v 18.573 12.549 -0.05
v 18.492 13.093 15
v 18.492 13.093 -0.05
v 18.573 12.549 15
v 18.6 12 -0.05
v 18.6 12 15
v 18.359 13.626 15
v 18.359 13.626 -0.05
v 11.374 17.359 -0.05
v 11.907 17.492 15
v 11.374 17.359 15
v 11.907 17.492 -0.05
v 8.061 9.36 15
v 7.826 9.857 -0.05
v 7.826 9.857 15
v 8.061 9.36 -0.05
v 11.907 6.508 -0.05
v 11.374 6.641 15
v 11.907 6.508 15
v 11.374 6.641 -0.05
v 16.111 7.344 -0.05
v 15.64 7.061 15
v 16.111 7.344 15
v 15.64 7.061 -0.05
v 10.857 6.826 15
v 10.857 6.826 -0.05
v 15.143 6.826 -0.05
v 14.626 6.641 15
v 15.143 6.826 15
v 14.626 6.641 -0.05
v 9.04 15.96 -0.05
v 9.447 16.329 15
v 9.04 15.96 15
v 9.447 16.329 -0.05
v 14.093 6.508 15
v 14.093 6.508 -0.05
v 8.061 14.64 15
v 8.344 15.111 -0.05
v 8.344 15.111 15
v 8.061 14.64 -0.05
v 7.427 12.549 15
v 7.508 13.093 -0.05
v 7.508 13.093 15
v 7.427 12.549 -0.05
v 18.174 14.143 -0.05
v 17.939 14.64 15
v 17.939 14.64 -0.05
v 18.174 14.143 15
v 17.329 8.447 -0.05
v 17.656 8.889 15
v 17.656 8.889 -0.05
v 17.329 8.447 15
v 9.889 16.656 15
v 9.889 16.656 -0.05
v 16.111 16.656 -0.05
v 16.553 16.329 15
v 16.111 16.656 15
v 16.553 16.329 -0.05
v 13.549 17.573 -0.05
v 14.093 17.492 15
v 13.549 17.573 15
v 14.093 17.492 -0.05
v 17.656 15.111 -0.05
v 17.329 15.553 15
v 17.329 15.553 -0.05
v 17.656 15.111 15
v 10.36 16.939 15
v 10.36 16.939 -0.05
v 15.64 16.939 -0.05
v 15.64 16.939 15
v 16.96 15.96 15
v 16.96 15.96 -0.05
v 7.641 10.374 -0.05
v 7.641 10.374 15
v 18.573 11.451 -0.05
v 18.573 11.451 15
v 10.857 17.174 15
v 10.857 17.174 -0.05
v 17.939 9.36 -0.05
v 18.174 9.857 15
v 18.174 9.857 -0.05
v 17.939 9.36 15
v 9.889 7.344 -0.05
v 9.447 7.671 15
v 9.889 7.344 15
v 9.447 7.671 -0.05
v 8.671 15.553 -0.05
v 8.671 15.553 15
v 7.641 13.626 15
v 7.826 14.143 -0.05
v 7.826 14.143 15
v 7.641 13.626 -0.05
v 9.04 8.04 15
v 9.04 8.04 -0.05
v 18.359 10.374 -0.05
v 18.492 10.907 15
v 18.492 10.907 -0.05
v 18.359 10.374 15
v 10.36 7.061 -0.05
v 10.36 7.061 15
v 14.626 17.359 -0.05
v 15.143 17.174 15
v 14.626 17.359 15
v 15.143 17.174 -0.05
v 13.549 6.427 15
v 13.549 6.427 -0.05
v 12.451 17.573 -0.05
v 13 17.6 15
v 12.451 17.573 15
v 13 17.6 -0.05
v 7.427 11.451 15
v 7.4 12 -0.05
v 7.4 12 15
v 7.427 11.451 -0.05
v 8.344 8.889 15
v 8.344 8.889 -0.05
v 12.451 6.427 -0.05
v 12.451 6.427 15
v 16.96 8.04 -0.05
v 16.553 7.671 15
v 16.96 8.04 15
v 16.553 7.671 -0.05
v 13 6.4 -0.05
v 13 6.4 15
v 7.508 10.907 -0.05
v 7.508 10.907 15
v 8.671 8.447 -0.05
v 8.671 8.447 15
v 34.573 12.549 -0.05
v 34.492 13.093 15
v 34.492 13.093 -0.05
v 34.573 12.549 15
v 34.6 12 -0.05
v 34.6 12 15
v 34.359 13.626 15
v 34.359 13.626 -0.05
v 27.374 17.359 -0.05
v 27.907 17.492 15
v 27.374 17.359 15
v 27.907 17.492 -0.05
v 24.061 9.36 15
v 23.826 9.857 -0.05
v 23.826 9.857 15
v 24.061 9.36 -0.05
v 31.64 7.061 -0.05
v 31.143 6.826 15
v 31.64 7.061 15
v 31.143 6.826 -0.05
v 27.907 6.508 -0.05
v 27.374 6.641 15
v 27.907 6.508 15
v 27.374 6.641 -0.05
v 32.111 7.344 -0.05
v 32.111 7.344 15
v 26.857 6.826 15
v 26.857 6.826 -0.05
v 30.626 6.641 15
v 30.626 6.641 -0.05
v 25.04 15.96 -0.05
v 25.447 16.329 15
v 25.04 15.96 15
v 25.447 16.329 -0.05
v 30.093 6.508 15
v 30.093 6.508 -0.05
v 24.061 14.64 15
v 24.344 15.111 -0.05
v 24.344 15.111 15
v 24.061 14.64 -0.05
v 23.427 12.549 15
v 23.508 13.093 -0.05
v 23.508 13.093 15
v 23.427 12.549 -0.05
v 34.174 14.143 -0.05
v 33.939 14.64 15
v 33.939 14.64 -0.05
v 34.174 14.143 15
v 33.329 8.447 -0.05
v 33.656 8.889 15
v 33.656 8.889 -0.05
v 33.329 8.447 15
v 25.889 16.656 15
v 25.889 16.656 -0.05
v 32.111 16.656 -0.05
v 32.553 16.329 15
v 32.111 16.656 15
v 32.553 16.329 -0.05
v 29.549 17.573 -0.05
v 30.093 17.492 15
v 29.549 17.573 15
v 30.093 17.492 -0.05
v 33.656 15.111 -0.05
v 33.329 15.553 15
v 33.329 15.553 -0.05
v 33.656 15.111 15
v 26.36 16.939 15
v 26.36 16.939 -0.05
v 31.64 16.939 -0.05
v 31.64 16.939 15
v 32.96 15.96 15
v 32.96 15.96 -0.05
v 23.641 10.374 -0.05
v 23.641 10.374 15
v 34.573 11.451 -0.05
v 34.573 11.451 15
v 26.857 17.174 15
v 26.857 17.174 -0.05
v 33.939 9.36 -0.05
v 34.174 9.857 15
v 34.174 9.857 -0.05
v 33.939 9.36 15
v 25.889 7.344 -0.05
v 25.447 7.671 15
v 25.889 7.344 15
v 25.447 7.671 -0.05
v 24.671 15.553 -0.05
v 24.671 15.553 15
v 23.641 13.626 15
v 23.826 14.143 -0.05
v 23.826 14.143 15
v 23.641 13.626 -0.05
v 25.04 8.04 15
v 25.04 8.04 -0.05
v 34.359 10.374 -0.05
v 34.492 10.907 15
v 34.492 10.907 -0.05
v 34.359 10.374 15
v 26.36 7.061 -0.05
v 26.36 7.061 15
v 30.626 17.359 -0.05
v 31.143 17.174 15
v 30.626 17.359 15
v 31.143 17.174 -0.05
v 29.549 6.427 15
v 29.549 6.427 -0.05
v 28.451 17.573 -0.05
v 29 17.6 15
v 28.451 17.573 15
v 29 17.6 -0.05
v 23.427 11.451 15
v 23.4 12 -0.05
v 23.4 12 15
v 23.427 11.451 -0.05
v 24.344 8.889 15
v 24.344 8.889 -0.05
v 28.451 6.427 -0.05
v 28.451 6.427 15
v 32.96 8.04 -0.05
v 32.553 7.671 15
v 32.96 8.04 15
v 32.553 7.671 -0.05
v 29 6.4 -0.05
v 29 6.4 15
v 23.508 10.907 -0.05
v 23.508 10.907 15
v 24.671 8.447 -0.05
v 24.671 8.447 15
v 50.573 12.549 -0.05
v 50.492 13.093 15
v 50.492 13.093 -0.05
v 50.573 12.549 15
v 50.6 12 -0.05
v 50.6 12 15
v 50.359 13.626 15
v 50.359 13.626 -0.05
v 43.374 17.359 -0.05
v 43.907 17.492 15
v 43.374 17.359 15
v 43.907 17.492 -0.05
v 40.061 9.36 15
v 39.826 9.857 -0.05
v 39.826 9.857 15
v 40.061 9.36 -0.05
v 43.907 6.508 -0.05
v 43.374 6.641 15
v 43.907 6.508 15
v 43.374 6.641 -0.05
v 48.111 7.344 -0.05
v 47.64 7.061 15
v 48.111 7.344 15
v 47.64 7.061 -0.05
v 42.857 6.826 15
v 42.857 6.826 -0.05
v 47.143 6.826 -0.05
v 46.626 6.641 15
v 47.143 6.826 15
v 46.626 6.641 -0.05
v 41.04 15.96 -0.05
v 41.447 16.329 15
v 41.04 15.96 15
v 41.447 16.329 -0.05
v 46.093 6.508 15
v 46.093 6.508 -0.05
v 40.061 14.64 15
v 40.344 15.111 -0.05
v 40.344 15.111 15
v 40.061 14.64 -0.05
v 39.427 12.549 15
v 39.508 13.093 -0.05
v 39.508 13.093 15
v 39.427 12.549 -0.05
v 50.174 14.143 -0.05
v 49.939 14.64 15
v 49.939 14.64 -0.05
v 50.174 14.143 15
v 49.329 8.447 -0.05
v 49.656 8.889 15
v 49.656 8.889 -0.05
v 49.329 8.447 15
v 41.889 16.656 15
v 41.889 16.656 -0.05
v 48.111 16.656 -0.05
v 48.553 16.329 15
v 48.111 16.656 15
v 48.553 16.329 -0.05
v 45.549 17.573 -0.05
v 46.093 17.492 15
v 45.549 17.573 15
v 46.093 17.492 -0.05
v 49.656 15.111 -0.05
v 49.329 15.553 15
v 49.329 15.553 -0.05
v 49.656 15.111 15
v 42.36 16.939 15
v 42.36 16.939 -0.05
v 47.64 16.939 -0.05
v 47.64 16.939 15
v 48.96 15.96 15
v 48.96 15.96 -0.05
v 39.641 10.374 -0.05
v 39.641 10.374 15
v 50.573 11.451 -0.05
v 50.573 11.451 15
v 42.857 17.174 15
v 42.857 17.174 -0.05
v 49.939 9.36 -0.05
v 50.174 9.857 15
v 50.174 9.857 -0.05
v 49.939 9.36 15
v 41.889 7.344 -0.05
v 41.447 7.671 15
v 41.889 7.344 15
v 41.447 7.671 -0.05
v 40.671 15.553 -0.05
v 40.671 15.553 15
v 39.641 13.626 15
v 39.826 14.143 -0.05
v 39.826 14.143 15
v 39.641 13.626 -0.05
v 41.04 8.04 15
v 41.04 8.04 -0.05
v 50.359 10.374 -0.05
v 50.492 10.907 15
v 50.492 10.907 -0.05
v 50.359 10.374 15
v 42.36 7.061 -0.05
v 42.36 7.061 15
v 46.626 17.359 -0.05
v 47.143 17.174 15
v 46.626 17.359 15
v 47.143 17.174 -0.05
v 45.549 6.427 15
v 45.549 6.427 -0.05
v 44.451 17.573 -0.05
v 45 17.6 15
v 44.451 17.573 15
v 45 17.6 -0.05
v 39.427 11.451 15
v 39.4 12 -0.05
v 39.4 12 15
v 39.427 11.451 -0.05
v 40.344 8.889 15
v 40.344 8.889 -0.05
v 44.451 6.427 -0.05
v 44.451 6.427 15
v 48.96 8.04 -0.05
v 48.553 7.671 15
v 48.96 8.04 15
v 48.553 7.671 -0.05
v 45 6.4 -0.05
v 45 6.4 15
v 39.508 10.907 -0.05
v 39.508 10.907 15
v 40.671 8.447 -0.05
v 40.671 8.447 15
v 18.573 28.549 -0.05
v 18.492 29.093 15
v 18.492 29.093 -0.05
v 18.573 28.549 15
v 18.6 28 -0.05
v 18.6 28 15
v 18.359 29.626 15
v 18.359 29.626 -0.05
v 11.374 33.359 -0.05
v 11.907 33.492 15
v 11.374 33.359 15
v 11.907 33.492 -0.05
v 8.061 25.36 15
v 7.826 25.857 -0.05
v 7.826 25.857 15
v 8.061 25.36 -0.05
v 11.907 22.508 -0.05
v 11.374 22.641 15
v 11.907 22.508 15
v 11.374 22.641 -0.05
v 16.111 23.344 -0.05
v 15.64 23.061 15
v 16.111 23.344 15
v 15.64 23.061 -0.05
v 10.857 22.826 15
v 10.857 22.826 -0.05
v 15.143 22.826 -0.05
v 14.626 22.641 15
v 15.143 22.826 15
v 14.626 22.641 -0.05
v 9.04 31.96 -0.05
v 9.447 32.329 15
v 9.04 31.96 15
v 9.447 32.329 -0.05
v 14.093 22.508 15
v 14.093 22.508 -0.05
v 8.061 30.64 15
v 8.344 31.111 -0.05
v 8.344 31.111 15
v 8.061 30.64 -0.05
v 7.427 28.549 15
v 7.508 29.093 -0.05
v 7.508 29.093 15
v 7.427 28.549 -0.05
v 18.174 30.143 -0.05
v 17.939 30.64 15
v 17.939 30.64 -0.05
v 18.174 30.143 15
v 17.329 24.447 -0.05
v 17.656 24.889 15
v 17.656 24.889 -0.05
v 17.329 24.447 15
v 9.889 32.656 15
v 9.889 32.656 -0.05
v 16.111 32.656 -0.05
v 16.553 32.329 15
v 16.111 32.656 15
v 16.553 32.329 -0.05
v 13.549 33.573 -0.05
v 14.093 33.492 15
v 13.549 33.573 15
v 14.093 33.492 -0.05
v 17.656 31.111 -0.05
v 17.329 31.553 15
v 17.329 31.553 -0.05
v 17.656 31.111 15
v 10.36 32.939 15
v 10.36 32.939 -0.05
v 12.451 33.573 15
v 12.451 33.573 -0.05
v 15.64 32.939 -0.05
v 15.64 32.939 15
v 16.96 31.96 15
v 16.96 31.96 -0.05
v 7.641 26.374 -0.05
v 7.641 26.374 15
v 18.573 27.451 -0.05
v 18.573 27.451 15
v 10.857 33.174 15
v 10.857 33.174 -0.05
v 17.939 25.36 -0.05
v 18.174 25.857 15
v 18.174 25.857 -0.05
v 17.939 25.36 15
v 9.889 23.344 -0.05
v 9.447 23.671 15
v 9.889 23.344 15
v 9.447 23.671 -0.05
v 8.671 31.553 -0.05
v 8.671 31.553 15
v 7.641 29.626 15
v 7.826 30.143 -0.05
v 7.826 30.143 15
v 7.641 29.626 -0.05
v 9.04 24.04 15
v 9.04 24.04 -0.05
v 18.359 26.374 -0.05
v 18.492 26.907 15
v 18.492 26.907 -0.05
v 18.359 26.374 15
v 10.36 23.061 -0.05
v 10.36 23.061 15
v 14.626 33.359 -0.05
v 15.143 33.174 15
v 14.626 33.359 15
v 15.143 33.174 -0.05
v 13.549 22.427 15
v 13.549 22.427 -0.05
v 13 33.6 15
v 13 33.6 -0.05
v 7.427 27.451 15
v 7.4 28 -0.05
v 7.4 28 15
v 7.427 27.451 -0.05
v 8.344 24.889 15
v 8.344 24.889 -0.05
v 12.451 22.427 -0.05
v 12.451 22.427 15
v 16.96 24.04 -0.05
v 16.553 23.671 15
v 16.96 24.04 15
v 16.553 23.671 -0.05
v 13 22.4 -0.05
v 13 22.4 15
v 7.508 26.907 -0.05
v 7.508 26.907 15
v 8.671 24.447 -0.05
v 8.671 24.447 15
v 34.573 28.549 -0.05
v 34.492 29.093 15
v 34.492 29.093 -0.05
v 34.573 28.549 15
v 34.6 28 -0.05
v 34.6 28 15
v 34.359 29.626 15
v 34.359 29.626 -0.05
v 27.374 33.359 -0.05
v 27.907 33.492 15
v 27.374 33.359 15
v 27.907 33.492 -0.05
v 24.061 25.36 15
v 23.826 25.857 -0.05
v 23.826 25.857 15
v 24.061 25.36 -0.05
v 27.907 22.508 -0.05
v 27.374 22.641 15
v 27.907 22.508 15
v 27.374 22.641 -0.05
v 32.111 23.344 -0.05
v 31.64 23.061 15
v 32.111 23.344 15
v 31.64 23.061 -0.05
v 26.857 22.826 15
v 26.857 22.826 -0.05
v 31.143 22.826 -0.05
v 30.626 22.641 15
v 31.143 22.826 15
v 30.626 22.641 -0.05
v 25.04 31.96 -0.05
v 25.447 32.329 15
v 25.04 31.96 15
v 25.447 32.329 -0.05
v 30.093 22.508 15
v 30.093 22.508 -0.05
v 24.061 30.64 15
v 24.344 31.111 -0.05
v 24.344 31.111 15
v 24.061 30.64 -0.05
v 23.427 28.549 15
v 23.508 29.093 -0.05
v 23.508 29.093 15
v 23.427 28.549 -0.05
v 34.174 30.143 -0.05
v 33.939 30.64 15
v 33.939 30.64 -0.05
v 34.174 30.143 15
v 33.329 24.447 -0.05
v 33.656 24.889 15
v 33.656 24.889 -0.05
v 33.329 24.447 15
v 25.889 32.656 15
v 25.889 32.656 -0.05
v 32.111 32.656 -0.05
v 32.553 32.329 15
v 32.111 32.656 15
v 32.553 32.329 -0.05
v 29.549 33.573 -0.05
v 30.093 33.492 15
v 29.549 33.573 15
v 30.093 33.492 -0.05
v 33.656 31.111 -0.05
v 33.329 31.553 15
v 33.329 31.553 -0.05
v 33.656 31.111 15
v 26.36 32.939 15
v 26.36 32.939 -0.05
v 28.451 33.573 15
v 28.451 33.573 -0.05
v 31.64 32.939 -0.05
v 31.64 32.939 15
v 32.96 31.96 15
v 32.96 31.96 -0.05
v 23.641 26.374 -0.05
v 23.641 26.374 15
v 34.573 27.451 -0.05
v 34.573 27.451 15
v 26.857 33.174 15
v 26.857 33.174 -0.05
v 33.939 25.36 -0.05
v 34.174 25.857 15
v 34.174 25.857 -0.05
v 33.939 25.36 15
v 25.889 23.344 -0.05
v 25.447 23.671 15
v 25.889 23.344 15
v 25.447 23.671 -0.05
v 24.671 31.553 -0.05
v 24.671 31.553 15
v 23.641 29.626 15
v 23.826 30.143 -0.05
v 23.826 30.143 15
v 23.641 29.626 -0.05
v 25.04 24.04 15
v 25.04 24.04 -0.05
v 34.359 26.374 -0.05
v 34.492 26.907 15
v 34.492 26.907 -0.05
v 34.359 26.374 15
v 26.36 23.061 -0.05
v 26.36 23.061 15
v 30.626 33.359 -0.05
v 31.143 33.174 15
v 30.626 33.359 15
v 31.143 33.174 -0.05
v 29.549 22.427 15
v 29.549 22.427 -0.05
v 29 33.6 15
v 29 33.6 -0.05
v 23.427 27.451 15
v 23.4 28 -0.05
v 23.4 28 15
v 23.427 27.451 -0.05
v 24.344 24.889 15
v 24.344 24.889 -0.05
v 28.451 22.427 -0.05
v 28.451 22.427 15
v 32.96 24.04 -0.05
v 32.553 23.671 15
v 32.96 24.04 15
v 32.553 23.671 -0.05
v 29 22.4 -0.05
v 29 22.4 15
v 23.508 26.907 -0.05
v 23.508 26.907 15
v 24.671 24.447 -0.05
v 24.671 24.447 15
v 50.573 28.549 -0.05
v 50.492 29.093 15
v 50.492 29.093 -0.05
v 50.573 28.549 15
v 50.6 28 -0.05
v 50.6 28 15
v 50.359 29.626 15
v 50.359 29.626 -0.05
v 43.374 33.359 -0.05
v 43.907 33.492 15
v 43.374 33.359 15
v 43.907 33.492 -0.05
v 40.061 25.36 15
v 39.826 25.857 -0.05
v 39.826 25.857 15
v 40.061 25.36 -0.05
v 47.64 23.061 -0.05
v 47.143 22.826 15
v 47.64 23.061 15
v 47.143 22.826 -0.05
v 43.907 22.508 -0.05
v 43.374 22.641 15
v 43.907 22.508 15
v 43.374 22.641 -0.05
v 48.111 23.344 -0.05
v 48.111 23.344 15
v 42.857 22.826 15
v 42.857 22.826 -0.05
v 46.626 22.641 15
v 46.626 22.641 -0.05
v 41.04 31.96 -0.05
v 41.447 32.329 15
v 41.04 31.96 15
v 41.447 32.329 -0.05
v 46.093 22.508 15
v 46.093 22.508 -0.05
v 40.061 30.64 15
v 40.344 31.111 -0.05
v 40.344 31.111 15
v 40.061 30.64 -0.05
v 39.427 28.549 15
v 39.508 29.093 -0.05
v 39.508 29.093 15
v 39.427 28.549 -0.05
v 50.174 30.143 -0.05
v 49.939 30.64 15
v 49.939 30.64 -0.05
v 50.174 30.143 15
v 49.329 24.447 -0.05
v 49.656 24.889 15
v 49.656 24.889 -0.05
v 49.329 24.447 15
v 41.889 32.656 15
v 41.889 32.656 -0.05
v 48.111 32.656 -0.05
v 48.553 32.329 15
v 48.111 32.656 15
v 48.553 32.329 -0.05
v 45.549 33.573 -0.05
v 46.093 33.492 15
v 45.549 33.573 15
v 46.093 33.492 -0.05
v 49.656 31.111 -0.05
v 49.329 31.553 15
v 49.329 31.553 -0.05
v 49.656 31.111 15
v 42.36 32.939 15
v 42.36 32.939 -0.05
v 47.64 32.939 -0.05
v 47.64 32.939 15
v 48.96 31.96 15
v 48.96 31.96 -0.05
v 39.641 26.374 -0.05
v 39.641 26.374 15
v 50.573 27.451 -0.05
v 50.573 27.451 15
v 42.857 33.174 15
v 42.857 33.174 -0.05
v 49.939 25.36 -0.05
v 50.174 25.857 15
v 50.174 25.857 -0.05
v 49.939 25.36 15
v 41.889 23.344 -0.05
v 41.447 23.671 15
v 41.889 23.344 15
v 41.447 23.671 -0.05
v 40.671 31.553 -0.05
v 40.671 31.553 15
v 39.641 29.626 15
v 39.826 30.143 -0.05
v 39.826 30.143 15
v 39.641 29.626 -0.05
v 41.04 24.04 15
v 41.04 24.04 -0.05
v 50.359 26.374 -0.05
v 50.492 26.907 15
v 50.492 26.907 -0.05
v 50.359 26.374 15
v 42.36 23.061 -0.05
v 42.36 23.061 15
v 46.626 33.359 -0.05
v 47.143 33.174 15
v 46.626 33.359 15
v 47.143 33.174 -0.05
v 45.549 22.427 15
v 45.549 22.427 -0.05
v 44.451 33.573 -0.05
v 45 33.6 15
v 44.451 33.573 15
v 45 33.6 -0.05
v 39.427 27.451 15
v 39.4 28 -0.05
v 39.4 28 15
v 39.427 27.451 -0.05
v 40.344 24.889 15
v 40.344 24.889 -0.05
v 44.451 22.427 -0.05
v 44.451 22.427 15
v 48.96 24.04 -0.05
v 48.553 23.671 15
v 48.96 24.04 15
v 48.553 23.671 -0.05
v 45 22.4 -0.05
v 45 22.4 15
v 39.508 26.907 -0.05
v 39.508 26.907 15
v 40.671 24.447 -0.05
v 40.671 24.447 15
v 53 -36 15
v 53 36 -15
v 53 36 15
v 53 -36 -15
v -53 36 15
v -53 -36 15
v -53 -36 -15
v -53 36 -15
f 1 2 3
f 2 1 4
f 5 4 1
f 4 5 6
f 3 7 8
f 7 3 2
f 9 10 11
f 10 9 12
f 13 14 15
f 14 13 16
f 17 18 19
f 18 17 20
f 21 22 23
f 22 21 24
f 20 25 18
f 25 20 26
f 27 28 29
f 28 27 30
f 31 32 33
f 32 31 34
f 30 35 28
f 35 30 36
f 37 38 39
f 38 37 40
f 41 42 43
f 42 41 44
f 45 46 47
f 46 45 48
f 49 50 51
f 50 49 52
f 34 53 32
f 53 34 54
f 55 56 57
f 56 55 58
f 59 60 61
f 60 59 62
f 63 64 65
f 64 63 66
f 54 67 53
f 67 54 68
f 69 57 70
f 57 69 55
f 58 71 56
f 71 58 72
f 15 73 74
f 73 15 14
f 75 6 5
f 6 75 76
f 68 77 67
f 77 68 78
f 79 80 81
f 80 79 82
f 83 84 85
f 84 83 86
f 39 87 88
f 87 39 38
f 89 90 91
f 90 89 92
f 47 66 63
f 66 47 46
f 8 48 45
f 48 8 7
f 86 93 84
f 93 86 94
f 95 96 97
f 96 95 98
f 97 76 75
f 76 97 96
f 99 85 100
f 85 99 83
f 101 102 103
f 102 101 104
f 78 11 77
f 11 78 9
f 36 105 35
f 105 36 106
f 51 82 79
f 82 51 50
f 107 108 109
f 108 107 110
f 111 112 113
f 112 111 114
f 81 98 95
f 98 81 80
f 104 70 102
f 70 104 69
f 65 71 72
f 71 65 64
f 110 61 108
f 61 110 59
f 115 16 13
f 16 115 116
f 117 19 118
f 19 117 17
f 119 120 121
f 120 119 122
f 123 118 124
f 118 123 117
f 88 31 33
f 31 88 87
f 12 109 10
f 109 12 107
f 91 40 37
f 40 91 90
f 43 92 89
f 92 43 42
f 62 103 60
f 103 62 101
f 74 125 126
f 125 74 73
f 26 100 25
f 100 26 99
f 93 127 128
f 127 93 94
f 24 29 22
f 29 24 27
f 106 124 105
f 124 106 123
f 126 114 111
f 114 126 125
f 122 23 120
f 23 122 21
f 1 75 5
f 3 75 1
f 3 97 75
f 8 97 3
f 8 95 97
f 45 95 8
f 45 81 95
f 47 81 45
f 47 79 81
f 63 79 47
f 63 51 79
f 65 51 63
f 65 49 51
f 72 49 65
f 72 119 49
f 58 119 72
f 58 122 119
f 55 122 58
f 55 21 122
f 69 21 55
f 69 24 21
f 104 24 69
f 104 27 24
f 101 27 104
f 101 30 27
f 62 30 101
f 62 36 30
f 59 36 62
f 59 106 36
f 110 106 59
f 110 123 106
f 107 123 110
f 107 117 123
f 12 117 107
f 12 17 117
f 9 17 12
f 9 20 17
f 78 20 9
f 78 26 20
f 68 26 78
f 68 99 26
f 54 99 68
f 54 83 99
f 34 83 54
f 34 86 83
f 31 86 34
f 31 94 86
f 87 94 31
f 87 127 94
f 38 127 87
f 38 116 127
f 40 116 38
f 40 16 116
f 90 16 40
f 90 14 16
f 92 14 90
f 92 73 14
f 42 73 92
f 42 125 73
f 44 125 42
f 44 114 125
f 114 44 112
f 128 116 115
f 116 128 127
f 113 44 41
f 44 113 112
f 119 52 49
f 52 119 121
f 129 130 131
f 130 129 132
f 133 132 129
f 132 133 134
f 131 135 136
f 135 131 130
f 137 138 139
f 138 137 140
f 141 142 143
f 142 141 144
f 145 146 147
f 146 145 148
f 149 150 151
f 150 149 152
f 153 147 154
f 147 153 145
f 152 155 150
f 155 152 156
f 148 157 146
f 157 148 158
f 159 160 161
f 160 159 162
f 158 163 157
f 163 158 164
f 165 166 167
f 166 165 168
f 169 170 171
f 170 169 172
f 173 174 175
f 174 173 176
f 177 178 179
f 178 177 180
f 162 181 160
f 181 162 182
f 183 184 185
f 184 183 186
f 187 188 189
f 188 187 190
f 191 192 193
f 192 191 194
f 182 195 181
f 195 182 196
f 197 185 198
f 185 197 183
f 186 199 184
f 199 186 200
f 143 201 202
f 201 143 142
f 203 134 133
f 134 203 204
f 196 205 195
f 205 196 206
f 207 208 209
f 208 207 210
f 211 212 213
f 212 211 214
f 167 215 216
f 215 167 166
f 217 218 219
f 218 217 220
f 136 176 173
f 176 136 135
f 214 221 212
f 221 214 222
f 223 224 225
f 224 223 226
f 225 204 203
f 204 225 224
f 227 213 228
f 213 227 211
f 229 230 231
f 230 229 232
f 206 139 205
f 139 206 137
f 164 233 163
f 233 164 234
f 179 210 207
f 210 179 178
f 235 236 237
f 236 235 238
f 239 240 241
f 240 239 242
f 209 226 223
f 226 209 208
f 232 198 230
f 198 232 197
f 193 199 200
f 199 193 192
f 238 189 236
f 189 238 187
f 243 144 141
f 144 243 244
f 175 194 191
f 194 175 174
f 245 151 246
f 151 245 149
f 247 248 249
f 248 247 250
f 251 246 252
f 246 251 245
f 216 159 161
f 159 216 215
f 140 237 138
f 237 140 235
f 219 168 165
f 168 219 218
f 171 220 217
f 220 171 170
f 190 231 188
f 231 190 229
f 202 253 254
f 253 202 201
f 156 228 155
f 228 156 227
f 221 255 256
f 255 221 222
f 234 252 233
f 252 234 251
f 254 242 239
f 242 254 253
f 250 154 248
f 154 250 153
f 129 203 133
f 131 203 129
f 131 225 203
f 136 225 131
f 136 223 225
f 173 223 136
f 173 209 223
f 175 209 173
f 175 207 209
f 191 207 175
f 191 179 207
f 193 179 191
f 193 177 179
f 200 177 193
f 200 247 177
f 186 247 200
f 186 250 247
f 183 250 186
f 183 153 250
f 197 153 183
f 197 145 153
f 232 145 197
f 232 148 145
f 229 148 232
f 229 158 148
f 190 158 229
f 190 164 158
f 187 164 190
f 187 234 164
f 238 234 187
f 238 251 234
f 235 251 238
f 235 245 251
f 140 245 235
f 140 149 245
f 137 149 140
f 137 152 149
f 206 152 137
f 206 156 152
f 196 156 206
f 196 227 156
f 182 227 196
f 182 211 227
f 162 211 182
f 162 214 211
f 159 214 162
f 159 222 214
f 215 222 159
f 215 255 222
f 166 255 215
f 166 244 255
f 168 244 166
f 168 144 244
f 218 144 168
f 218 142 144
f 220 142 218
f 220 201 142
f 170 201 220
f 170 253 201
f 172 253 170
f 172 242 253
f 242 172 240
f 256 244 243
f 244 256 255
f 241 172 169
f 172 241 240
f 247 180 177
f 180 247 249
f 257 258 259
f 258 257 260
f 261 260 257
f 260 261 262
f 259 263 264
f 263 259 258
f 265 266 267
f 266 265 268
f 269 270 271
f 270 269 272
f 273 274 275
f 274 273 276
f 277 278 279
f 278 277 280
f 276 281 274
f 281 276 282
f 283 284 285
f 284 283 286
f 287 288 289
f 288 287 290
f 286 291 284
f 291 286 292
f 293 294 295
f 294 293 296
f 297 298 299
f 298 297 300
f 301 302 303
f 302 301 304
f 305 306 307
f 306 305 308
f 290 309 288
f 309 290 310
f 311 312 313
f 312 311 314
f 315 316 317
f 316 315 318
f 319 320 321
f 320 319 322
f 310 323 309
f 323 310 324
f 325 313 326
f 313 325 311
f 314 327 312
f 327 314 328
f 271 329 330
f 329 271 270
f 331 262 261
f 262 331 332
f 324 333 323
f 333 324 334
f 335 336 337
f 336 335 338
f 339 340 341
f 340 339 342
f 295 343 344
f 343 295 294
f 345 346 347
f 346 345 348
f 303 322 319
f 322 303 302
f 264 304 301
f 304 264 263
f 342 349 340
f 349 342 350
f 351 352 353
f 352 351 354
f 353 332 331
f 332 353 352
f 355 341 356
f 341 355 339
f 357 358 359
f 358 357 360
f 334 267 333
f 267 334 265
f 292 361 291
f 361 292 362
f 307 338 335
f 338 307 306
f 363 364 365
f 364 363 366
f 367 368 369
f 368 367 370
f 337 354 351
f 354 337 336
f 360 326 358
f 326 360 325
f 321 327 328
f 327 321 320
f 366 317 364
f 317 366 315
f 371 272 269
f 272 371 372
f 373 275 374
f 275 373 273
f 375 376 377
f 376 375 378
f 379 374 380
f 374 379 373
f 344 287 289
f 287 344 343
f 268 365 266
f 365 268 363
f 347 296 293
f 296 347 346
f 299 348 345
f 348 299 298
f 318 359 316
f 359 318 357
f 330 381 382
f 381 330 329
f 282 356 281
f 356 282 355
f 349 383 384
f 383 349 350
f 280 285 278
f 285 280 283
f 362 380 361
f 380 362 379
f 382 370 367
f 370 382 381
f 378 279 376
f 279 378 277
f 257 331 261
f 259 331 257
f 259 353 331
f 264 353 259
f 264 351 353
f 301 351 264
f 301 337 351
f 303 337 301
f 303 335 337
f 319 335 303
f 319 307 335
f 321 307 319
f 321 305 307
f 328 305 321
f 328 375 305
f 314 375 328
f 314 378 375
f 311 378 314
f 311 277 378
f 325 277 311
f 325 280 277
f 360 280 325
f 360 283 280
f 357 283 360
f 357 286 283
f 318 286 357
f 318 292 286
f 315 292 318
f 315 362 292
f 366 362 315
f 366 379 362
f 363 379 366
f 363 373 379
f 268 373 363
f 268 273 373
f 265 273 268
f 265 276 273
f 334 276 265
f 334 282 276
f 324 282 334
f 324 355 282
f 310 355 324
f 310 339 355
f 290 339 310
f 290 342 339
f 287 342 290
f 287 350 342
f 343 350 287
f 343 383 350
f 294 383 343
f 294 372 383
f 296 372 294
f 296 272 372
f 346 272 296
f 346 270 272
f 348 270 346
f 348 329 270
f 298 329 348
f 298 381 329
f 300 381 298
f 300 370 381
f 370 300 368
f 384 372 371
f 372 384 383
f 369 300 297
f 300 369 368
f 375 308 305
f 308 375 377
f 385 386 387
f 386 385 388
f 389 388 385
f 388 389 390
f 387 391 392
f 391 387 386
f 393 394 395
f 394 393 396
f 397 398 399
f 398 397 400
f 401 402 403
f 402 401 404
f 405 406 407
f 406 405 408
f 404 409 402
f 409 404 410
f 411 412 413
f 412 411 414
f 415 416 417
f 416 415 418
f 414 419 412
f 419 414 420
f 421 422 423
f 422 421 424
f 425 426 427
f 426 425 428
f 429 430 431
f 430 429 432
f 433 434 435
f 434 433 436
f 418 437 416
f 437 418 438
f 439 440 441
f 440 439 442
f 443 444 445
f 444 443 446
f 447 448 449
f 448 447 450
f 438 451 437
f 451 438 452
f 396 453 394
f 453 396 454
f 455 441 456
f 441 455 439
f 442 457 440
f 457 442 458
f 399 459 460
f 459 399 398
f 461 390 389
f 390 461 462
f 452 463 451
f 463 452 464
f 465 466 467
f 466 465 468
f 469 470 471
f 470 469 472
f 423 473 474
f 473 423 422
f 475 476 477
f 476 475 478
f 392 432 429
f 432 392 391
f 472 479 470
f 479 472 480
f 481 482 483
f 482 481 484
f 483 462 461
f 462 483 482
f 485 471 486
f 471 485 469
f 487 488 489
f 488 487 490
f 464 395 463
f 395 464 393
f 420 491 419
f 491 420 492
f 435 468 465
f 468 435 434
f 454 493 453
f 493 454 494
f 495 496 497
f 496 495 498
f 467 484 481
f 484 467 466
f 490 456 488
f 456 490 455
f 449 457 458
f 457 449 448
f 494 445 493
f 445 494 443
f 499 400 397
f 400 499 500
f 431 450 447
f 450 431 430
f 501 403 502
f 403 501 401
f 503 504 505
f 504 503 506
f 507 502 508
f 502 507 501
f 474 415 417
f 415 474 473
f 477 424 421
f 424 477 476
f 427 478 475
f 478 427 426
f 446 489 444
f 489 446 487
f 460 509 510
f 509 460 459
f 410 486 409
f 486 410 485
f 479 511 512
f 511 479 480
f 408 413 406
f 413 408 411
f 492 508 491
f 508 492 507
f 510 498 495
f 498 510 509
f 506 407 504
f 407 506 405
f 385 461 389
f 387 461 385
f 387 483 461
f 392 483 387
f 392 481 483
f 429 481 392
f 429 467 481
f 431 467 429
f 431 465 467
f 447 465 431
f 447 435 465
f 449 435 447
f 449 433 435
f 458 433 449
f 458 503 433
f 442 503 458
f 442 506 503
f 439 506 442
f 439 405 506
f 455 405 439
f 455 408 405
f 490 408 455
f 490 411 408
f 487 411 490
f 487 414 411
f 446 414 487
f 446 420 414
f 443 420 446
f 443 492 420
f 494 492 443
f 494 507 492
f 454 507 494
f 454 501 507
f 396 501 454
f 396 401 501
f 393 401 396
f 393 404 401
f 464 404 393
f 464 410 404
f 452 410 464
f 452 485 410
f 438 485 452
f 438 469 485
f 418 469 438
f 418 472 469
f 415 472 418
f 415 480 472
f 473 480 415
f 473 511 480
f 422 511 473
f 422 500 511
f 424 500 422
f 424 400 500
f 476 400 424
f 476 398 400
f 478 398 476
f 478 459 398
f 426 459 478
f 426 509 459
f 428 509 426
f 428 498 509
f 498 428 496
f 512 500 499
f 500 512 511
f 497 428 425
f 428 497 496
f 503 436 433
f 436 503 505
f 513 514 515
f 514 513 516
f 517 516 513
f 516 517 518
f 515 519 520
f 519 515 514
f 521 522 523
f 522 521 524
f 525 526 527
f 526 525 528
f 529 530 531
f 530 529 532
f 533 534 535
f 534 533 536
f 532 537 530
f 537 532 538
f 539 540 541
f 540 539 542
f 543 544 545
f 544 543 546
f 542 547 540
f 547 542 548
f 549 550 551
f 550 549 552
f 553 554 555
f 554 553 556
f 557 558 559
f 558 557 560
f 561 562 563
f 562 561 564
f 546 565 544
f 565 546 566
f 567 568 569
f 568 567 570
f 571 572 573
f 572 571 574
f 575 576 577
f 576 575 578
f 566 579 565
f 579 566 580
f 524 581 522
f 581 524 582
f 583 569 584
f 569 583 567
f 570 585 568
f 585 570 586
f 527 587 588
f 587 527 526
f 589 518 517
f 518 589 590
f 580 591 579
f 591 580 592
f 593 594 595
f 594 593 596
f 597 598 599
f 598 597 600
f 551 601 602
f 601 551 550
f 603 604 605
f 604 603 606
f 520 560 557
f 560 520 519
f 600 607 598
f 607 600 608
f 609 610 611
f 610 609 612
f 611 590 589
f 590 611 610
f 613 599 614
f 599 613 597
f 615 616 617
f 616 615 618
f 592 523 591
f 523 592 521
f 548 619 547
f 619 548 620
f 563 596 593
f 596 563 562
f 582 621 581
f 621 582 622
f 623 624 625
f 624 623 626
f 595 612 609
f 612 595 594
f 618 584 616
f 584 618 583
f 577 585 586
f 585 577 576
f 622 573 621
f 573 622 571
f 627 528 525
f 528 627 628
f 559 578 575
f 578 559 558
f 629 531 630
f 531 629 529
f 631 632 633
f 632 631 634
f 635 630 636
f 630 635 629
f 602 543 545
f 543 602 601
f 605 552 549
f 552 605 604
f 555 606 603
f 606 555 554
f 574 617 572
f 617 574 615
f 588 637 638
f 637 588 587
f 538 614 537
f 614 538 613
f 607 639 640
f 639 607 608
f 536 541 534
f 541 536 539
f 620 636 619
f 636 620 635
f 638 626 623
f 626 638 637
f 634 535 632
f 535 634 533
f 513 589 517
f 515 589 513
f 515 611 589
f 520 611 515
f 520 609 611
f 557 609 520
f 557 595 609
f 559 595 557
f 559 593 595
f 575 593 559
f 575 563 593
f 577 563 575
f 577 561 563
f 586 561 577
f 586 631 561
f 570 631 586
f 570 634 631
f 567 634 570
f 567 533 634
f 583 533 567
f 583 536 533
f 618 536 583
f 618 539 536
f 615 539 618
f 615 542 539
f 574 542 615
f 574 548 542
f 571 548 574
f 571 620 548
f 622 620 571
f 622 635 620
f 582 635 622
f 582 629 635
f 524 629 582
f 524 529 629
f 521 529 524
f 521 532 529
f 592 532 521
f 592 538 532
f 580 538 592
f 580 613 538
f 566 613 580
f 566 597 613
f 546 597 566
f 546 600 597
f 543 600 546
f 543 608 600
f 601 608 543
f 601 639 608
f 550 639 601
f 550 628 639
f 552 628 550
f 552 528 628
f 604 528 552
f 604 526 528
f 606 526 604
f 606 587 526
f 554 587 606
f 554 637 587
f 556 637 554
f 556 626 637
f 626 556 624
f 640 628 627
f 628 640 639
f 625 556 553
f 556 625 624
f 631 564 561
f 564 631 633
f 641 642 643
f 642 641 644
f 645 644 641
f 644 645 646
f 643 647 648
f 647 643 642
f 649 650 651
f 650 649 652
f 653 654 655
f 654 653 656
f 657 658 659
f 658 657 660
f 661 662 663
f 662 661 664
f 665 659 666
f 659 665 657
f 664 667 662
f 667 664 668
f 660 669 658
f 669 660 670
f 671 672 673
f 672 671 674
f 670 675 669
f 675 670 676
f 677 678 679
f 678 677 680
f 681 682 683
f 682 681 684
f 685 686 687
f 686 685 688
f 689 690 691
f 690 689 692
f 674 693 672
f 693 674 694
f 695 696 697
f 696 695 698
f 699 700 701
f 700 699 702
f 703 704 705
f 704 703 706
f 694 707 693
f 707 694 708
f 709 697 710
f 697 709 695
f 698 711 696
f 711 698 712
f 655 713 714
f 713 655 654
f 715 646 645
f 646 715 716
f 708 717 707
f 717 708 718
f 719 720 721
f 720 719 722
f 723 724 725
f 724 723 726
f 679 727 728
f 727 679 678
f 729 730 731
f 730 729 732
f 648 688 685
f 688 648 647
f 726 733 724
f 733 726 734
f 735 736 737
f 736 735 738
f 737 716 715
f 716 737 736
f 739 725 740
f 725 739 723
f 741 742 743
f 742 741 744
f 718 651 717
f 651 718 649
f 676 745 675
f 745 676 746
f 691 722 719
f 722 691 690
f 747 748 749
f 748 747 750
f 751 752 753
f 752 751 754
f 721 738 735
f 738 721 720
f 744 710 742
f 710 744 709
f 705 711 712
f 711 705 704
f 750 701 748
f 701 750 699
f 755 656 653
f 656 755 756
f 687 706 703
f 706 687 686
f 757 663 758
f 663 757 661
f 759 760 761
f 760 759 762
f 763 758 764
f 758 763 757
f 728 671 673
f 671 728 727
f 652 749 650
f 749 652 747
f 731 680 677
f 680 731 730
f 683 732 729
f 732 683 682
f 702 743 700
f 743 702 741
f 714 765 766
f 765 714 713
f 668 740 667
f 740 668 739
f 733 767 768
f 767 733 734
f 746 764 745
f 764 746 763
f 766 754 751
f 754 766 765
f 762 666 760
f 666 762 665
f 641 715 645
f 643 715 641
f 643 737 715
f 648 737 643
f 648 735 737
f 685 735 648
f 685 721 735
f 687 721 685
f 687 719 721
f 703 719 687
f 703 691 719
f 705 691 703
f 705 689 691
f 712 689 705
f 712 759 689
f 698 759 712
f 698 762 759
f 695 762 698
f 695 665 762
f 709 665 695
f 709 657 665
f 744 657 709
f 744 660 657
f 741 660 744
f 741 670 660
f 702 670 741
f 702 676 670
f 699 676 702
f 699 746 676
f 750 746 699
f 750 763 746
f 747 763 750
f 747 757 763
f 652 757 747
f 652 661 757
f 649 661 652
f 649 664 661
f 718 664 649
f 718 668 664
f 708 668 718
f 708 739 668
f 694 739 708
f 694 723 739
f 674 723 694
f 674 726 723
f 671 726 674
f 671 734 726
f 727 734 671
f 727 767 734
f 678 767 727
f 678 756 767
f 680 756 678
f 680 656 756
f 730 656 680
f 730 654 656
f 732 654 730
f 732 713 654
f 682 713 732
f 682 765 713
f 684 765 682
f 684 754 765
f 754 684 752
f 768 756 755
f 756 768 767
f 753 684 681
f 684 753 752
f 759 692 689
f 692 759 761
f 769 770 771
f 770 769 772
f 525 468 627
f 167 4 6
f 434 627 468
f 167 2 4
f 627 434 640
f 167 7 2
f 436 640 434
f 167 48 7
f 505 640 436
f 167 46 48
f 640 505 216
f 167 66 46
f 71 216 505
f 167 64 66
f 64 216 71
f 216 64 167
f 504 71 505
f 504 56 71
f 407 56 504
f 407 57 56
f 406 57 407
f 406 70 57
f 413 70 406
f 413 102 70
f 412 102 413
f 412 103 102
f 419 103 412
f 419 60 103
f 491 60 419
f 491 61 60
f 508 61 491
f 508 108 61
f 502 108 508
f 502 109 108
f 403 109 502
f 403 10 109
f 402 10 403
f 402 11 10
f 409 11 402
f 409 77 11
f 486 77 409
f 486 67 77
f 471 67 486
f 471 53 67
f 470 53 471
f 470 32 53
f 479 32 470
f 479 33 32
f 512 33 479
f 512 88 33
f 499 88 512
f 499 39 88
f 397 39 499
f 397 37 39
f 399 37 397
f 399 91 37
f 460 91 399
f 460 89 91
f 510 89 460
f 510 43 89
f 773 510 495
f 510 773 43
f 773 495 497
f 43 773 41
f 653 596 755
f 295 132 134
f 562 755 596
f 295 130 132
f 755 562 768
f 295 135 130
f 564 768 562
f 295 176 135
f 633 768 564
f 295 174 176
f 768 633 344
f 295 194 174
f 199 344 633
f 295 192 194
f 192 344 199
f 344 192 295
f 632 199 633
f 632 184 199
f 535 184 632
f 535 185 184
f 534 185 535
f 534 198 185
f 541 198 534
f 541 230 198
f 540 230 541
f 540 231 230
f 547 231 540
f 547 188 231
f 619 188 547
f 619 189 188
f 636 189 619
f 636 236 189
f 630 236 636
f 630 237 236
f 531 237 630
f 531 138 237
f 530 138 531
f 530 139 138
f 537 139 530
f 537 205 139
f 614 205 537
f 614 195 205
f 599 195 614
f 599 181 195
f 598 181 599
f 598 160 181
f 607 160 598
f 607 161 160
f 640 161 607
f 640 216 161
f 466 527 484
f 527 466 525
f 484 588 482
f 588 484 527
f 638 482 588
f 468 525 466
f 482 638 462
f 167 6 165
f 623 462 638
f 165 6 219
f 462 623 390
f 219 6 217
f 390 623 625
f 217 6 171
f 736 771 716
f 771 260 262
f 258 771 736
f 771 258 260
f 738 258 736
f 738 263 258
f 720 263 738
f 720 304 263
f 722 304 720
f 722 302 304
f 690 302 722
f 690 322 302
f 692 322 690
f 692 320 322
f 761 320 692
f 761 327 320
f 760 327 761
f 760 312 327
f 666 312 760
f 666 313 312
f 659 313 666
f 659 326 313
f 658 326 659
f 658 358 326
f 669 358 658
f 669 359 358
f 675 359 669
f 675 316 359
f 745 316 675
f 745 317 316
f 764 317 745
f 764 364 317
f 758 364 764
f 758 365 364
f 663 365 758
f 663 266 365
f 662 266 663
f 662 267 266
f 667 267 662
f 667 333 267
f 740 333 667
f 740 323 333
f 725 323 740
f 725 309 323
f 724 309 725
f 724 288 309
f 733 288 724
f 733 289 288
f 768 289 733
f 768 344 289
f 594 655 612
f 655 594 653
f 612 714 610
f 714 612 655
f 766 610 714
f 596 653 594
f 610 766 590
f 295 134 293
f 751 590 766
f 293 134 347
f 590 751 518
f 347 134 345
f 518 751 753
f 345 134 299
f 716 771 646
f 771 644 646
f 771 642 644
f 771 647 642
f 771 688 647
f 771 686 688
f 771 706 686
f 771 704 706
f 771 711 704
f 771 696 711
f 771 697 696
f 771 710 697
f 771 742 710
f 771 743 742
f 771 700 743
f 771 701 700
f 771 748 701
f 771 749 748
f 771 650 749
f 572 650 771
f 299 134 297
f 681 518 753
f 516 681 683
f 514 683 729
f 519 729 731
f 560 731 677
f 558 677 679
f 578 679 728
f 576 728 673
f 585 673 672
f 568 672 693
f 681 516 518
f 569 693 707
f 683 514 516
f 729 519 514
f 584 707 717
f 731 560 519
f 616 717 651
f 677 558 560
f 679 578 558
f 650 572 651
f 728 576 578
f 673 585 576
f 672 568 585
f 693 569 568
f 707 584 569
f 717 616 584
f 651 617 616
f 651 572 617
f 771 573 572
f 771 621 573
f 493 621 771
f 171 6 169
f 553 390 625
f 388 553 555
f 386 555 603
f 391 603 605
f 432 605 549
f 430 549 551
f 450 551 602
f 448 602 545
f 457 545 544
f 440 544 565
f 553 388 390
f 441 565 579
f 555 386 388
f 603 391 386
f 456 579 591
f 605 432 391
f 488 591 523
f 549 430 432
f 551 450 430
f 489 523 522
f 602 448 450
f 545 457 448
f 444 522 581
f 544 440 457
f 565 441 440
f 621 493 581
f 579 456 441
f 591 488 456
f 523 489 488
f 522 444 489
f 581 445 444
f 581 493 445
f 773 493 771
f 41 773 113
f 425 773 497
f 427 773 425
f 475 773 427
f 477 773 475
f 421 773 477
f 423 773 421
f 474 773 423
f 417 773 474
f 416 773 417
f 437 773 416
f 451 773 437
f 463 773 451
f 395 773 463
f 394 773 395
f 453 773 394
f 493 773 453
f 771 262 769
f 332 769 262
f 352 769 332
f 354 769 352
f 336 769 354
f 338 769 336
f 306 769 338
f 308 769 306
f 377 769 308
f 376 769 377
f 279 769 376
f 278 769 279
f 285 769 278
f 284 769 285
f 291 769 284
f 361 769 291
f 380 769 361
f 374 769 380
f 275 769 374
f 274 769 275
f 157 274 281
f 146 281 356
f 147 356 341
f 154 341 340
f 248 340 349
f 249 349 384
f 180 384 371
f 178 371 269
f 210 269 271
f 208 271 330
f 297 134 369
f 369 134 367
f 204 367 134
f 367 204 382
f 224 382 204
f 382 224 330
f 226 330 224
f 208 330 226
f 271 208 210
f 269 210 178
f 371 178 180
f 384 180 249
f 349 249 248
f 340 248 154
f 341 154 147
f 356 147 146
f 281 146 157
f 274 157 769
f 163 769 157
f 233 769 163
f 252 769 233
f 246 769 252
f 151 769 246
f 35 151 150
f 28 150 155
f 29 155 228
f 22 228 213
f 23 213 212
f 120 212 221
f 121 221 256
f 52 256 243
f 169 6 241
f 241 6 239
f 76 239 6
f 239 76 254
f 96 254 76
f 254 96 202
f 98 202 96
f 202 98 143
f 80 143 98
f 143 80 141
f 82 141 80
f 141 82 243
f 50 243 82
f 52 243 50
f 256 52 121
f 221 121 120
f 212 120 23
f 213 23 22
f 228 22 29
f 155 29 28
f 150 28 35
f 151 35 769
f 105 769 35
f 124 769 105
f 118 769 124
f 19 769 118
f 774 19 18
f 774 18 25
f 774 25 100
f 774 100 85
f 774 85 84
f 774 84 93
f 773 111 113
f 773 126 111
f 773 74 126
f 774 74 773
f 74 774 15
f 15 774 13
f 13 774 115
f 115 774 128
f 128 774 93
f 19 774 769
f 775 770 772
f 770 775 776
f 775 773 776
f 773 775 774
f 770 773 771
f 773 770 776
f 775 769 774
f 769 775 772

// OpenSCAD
// Bench Rack for 1.5 mL Microcentrifuge Tubes
// Dimensions based on user specifications

// Block Dimensions
BLOCK_LENGTH_X = 106; // mm
BLOCK_WIDTH_Y = 72;   // mm
BLOCK_HEIGHT_Z = 30;  // mm

// Grid Configuration
NUM_ROWS_Y = 4;       // Rows along Y
NUM_COLS_X = 6;       // Columns along X
GRID_SPACING_X = 16;  // mm centre-to-centre
GRID_SPACING_Y = 16;  // mm centre-to-centre

// Hole Dimensions
HOLE_DIAMETER = 11.2; // mm
HOLE_DEPTH = 25;      // mm (open top, closed bottom)
FLOOR_HEIGHT = 5;     // mm (solid floor at bottom)

// Tolerance for cutting operations (to ensure clean removal)
CUT_TOLERANCE = 0.1;  // mm

// Set global faceting for smooth curves
$fn = 64;

// Calculate grid offsets to center the grid on the block
// Total span X = (NUM_COLS_X - 1) * GRID_SPACING_X
// Offset X = (BLOCK_LENGTH_X - Total span X) / 2
GRID_OFFSET_X = (BLOCK_LENGTH_X - (NUM_COLS_X - 1) * GRID_SPACING_X) / 2;

// Total span Y = (NUM_ROWS_Y - 1) * GRID_SPACING_Y
// Offset Y = (BLOCK_WIDTH_Y - Total span Y) / 2
GRID_OFFSET_Y = (BLOCK_WIDTH_Y - (NUM_ROWS_Y - 1) * GRID_SPACING_Y) / 2;

// Main Block
difference() {
    // Create the solid rectangular block
    cube([BLOCK_LENGTH_X, BLOCK_WIDTH_Y, BLOCK_HEIGHT_Z], center = true);
    
    // Create holes
    // We use a loop to generate cylinders that cut through the block
    // The cylinder height is the full block height to ensure clean cuts
    for (r = [0 : NUM_ROWS_Y - 1]) {
        for (c = [0 : NUM_COLS_X - 1]) {
            // Calculate position of each hole center
            pos_x = GRID_OFFSET_X + c * GRID_SPACING_X;
            pos_y = GRID_OFFSET_Y + r * GRID_SPACING_Y;
            
            // Define the cutting cylinder
            // Height is slightly larger than block to ensure full penetration
            hole_height = BLOCK_HEIGHT_Z + CUT_TOLERANCE;
            
            translate([pos_x, pos_y, -CUT_TOLERANCE/2]) {
                cylinder(
                    h = hole_height,
                    d = HOLE_DIAMETER,
                    $fn = 64
                );
            }
        }
    }
}
